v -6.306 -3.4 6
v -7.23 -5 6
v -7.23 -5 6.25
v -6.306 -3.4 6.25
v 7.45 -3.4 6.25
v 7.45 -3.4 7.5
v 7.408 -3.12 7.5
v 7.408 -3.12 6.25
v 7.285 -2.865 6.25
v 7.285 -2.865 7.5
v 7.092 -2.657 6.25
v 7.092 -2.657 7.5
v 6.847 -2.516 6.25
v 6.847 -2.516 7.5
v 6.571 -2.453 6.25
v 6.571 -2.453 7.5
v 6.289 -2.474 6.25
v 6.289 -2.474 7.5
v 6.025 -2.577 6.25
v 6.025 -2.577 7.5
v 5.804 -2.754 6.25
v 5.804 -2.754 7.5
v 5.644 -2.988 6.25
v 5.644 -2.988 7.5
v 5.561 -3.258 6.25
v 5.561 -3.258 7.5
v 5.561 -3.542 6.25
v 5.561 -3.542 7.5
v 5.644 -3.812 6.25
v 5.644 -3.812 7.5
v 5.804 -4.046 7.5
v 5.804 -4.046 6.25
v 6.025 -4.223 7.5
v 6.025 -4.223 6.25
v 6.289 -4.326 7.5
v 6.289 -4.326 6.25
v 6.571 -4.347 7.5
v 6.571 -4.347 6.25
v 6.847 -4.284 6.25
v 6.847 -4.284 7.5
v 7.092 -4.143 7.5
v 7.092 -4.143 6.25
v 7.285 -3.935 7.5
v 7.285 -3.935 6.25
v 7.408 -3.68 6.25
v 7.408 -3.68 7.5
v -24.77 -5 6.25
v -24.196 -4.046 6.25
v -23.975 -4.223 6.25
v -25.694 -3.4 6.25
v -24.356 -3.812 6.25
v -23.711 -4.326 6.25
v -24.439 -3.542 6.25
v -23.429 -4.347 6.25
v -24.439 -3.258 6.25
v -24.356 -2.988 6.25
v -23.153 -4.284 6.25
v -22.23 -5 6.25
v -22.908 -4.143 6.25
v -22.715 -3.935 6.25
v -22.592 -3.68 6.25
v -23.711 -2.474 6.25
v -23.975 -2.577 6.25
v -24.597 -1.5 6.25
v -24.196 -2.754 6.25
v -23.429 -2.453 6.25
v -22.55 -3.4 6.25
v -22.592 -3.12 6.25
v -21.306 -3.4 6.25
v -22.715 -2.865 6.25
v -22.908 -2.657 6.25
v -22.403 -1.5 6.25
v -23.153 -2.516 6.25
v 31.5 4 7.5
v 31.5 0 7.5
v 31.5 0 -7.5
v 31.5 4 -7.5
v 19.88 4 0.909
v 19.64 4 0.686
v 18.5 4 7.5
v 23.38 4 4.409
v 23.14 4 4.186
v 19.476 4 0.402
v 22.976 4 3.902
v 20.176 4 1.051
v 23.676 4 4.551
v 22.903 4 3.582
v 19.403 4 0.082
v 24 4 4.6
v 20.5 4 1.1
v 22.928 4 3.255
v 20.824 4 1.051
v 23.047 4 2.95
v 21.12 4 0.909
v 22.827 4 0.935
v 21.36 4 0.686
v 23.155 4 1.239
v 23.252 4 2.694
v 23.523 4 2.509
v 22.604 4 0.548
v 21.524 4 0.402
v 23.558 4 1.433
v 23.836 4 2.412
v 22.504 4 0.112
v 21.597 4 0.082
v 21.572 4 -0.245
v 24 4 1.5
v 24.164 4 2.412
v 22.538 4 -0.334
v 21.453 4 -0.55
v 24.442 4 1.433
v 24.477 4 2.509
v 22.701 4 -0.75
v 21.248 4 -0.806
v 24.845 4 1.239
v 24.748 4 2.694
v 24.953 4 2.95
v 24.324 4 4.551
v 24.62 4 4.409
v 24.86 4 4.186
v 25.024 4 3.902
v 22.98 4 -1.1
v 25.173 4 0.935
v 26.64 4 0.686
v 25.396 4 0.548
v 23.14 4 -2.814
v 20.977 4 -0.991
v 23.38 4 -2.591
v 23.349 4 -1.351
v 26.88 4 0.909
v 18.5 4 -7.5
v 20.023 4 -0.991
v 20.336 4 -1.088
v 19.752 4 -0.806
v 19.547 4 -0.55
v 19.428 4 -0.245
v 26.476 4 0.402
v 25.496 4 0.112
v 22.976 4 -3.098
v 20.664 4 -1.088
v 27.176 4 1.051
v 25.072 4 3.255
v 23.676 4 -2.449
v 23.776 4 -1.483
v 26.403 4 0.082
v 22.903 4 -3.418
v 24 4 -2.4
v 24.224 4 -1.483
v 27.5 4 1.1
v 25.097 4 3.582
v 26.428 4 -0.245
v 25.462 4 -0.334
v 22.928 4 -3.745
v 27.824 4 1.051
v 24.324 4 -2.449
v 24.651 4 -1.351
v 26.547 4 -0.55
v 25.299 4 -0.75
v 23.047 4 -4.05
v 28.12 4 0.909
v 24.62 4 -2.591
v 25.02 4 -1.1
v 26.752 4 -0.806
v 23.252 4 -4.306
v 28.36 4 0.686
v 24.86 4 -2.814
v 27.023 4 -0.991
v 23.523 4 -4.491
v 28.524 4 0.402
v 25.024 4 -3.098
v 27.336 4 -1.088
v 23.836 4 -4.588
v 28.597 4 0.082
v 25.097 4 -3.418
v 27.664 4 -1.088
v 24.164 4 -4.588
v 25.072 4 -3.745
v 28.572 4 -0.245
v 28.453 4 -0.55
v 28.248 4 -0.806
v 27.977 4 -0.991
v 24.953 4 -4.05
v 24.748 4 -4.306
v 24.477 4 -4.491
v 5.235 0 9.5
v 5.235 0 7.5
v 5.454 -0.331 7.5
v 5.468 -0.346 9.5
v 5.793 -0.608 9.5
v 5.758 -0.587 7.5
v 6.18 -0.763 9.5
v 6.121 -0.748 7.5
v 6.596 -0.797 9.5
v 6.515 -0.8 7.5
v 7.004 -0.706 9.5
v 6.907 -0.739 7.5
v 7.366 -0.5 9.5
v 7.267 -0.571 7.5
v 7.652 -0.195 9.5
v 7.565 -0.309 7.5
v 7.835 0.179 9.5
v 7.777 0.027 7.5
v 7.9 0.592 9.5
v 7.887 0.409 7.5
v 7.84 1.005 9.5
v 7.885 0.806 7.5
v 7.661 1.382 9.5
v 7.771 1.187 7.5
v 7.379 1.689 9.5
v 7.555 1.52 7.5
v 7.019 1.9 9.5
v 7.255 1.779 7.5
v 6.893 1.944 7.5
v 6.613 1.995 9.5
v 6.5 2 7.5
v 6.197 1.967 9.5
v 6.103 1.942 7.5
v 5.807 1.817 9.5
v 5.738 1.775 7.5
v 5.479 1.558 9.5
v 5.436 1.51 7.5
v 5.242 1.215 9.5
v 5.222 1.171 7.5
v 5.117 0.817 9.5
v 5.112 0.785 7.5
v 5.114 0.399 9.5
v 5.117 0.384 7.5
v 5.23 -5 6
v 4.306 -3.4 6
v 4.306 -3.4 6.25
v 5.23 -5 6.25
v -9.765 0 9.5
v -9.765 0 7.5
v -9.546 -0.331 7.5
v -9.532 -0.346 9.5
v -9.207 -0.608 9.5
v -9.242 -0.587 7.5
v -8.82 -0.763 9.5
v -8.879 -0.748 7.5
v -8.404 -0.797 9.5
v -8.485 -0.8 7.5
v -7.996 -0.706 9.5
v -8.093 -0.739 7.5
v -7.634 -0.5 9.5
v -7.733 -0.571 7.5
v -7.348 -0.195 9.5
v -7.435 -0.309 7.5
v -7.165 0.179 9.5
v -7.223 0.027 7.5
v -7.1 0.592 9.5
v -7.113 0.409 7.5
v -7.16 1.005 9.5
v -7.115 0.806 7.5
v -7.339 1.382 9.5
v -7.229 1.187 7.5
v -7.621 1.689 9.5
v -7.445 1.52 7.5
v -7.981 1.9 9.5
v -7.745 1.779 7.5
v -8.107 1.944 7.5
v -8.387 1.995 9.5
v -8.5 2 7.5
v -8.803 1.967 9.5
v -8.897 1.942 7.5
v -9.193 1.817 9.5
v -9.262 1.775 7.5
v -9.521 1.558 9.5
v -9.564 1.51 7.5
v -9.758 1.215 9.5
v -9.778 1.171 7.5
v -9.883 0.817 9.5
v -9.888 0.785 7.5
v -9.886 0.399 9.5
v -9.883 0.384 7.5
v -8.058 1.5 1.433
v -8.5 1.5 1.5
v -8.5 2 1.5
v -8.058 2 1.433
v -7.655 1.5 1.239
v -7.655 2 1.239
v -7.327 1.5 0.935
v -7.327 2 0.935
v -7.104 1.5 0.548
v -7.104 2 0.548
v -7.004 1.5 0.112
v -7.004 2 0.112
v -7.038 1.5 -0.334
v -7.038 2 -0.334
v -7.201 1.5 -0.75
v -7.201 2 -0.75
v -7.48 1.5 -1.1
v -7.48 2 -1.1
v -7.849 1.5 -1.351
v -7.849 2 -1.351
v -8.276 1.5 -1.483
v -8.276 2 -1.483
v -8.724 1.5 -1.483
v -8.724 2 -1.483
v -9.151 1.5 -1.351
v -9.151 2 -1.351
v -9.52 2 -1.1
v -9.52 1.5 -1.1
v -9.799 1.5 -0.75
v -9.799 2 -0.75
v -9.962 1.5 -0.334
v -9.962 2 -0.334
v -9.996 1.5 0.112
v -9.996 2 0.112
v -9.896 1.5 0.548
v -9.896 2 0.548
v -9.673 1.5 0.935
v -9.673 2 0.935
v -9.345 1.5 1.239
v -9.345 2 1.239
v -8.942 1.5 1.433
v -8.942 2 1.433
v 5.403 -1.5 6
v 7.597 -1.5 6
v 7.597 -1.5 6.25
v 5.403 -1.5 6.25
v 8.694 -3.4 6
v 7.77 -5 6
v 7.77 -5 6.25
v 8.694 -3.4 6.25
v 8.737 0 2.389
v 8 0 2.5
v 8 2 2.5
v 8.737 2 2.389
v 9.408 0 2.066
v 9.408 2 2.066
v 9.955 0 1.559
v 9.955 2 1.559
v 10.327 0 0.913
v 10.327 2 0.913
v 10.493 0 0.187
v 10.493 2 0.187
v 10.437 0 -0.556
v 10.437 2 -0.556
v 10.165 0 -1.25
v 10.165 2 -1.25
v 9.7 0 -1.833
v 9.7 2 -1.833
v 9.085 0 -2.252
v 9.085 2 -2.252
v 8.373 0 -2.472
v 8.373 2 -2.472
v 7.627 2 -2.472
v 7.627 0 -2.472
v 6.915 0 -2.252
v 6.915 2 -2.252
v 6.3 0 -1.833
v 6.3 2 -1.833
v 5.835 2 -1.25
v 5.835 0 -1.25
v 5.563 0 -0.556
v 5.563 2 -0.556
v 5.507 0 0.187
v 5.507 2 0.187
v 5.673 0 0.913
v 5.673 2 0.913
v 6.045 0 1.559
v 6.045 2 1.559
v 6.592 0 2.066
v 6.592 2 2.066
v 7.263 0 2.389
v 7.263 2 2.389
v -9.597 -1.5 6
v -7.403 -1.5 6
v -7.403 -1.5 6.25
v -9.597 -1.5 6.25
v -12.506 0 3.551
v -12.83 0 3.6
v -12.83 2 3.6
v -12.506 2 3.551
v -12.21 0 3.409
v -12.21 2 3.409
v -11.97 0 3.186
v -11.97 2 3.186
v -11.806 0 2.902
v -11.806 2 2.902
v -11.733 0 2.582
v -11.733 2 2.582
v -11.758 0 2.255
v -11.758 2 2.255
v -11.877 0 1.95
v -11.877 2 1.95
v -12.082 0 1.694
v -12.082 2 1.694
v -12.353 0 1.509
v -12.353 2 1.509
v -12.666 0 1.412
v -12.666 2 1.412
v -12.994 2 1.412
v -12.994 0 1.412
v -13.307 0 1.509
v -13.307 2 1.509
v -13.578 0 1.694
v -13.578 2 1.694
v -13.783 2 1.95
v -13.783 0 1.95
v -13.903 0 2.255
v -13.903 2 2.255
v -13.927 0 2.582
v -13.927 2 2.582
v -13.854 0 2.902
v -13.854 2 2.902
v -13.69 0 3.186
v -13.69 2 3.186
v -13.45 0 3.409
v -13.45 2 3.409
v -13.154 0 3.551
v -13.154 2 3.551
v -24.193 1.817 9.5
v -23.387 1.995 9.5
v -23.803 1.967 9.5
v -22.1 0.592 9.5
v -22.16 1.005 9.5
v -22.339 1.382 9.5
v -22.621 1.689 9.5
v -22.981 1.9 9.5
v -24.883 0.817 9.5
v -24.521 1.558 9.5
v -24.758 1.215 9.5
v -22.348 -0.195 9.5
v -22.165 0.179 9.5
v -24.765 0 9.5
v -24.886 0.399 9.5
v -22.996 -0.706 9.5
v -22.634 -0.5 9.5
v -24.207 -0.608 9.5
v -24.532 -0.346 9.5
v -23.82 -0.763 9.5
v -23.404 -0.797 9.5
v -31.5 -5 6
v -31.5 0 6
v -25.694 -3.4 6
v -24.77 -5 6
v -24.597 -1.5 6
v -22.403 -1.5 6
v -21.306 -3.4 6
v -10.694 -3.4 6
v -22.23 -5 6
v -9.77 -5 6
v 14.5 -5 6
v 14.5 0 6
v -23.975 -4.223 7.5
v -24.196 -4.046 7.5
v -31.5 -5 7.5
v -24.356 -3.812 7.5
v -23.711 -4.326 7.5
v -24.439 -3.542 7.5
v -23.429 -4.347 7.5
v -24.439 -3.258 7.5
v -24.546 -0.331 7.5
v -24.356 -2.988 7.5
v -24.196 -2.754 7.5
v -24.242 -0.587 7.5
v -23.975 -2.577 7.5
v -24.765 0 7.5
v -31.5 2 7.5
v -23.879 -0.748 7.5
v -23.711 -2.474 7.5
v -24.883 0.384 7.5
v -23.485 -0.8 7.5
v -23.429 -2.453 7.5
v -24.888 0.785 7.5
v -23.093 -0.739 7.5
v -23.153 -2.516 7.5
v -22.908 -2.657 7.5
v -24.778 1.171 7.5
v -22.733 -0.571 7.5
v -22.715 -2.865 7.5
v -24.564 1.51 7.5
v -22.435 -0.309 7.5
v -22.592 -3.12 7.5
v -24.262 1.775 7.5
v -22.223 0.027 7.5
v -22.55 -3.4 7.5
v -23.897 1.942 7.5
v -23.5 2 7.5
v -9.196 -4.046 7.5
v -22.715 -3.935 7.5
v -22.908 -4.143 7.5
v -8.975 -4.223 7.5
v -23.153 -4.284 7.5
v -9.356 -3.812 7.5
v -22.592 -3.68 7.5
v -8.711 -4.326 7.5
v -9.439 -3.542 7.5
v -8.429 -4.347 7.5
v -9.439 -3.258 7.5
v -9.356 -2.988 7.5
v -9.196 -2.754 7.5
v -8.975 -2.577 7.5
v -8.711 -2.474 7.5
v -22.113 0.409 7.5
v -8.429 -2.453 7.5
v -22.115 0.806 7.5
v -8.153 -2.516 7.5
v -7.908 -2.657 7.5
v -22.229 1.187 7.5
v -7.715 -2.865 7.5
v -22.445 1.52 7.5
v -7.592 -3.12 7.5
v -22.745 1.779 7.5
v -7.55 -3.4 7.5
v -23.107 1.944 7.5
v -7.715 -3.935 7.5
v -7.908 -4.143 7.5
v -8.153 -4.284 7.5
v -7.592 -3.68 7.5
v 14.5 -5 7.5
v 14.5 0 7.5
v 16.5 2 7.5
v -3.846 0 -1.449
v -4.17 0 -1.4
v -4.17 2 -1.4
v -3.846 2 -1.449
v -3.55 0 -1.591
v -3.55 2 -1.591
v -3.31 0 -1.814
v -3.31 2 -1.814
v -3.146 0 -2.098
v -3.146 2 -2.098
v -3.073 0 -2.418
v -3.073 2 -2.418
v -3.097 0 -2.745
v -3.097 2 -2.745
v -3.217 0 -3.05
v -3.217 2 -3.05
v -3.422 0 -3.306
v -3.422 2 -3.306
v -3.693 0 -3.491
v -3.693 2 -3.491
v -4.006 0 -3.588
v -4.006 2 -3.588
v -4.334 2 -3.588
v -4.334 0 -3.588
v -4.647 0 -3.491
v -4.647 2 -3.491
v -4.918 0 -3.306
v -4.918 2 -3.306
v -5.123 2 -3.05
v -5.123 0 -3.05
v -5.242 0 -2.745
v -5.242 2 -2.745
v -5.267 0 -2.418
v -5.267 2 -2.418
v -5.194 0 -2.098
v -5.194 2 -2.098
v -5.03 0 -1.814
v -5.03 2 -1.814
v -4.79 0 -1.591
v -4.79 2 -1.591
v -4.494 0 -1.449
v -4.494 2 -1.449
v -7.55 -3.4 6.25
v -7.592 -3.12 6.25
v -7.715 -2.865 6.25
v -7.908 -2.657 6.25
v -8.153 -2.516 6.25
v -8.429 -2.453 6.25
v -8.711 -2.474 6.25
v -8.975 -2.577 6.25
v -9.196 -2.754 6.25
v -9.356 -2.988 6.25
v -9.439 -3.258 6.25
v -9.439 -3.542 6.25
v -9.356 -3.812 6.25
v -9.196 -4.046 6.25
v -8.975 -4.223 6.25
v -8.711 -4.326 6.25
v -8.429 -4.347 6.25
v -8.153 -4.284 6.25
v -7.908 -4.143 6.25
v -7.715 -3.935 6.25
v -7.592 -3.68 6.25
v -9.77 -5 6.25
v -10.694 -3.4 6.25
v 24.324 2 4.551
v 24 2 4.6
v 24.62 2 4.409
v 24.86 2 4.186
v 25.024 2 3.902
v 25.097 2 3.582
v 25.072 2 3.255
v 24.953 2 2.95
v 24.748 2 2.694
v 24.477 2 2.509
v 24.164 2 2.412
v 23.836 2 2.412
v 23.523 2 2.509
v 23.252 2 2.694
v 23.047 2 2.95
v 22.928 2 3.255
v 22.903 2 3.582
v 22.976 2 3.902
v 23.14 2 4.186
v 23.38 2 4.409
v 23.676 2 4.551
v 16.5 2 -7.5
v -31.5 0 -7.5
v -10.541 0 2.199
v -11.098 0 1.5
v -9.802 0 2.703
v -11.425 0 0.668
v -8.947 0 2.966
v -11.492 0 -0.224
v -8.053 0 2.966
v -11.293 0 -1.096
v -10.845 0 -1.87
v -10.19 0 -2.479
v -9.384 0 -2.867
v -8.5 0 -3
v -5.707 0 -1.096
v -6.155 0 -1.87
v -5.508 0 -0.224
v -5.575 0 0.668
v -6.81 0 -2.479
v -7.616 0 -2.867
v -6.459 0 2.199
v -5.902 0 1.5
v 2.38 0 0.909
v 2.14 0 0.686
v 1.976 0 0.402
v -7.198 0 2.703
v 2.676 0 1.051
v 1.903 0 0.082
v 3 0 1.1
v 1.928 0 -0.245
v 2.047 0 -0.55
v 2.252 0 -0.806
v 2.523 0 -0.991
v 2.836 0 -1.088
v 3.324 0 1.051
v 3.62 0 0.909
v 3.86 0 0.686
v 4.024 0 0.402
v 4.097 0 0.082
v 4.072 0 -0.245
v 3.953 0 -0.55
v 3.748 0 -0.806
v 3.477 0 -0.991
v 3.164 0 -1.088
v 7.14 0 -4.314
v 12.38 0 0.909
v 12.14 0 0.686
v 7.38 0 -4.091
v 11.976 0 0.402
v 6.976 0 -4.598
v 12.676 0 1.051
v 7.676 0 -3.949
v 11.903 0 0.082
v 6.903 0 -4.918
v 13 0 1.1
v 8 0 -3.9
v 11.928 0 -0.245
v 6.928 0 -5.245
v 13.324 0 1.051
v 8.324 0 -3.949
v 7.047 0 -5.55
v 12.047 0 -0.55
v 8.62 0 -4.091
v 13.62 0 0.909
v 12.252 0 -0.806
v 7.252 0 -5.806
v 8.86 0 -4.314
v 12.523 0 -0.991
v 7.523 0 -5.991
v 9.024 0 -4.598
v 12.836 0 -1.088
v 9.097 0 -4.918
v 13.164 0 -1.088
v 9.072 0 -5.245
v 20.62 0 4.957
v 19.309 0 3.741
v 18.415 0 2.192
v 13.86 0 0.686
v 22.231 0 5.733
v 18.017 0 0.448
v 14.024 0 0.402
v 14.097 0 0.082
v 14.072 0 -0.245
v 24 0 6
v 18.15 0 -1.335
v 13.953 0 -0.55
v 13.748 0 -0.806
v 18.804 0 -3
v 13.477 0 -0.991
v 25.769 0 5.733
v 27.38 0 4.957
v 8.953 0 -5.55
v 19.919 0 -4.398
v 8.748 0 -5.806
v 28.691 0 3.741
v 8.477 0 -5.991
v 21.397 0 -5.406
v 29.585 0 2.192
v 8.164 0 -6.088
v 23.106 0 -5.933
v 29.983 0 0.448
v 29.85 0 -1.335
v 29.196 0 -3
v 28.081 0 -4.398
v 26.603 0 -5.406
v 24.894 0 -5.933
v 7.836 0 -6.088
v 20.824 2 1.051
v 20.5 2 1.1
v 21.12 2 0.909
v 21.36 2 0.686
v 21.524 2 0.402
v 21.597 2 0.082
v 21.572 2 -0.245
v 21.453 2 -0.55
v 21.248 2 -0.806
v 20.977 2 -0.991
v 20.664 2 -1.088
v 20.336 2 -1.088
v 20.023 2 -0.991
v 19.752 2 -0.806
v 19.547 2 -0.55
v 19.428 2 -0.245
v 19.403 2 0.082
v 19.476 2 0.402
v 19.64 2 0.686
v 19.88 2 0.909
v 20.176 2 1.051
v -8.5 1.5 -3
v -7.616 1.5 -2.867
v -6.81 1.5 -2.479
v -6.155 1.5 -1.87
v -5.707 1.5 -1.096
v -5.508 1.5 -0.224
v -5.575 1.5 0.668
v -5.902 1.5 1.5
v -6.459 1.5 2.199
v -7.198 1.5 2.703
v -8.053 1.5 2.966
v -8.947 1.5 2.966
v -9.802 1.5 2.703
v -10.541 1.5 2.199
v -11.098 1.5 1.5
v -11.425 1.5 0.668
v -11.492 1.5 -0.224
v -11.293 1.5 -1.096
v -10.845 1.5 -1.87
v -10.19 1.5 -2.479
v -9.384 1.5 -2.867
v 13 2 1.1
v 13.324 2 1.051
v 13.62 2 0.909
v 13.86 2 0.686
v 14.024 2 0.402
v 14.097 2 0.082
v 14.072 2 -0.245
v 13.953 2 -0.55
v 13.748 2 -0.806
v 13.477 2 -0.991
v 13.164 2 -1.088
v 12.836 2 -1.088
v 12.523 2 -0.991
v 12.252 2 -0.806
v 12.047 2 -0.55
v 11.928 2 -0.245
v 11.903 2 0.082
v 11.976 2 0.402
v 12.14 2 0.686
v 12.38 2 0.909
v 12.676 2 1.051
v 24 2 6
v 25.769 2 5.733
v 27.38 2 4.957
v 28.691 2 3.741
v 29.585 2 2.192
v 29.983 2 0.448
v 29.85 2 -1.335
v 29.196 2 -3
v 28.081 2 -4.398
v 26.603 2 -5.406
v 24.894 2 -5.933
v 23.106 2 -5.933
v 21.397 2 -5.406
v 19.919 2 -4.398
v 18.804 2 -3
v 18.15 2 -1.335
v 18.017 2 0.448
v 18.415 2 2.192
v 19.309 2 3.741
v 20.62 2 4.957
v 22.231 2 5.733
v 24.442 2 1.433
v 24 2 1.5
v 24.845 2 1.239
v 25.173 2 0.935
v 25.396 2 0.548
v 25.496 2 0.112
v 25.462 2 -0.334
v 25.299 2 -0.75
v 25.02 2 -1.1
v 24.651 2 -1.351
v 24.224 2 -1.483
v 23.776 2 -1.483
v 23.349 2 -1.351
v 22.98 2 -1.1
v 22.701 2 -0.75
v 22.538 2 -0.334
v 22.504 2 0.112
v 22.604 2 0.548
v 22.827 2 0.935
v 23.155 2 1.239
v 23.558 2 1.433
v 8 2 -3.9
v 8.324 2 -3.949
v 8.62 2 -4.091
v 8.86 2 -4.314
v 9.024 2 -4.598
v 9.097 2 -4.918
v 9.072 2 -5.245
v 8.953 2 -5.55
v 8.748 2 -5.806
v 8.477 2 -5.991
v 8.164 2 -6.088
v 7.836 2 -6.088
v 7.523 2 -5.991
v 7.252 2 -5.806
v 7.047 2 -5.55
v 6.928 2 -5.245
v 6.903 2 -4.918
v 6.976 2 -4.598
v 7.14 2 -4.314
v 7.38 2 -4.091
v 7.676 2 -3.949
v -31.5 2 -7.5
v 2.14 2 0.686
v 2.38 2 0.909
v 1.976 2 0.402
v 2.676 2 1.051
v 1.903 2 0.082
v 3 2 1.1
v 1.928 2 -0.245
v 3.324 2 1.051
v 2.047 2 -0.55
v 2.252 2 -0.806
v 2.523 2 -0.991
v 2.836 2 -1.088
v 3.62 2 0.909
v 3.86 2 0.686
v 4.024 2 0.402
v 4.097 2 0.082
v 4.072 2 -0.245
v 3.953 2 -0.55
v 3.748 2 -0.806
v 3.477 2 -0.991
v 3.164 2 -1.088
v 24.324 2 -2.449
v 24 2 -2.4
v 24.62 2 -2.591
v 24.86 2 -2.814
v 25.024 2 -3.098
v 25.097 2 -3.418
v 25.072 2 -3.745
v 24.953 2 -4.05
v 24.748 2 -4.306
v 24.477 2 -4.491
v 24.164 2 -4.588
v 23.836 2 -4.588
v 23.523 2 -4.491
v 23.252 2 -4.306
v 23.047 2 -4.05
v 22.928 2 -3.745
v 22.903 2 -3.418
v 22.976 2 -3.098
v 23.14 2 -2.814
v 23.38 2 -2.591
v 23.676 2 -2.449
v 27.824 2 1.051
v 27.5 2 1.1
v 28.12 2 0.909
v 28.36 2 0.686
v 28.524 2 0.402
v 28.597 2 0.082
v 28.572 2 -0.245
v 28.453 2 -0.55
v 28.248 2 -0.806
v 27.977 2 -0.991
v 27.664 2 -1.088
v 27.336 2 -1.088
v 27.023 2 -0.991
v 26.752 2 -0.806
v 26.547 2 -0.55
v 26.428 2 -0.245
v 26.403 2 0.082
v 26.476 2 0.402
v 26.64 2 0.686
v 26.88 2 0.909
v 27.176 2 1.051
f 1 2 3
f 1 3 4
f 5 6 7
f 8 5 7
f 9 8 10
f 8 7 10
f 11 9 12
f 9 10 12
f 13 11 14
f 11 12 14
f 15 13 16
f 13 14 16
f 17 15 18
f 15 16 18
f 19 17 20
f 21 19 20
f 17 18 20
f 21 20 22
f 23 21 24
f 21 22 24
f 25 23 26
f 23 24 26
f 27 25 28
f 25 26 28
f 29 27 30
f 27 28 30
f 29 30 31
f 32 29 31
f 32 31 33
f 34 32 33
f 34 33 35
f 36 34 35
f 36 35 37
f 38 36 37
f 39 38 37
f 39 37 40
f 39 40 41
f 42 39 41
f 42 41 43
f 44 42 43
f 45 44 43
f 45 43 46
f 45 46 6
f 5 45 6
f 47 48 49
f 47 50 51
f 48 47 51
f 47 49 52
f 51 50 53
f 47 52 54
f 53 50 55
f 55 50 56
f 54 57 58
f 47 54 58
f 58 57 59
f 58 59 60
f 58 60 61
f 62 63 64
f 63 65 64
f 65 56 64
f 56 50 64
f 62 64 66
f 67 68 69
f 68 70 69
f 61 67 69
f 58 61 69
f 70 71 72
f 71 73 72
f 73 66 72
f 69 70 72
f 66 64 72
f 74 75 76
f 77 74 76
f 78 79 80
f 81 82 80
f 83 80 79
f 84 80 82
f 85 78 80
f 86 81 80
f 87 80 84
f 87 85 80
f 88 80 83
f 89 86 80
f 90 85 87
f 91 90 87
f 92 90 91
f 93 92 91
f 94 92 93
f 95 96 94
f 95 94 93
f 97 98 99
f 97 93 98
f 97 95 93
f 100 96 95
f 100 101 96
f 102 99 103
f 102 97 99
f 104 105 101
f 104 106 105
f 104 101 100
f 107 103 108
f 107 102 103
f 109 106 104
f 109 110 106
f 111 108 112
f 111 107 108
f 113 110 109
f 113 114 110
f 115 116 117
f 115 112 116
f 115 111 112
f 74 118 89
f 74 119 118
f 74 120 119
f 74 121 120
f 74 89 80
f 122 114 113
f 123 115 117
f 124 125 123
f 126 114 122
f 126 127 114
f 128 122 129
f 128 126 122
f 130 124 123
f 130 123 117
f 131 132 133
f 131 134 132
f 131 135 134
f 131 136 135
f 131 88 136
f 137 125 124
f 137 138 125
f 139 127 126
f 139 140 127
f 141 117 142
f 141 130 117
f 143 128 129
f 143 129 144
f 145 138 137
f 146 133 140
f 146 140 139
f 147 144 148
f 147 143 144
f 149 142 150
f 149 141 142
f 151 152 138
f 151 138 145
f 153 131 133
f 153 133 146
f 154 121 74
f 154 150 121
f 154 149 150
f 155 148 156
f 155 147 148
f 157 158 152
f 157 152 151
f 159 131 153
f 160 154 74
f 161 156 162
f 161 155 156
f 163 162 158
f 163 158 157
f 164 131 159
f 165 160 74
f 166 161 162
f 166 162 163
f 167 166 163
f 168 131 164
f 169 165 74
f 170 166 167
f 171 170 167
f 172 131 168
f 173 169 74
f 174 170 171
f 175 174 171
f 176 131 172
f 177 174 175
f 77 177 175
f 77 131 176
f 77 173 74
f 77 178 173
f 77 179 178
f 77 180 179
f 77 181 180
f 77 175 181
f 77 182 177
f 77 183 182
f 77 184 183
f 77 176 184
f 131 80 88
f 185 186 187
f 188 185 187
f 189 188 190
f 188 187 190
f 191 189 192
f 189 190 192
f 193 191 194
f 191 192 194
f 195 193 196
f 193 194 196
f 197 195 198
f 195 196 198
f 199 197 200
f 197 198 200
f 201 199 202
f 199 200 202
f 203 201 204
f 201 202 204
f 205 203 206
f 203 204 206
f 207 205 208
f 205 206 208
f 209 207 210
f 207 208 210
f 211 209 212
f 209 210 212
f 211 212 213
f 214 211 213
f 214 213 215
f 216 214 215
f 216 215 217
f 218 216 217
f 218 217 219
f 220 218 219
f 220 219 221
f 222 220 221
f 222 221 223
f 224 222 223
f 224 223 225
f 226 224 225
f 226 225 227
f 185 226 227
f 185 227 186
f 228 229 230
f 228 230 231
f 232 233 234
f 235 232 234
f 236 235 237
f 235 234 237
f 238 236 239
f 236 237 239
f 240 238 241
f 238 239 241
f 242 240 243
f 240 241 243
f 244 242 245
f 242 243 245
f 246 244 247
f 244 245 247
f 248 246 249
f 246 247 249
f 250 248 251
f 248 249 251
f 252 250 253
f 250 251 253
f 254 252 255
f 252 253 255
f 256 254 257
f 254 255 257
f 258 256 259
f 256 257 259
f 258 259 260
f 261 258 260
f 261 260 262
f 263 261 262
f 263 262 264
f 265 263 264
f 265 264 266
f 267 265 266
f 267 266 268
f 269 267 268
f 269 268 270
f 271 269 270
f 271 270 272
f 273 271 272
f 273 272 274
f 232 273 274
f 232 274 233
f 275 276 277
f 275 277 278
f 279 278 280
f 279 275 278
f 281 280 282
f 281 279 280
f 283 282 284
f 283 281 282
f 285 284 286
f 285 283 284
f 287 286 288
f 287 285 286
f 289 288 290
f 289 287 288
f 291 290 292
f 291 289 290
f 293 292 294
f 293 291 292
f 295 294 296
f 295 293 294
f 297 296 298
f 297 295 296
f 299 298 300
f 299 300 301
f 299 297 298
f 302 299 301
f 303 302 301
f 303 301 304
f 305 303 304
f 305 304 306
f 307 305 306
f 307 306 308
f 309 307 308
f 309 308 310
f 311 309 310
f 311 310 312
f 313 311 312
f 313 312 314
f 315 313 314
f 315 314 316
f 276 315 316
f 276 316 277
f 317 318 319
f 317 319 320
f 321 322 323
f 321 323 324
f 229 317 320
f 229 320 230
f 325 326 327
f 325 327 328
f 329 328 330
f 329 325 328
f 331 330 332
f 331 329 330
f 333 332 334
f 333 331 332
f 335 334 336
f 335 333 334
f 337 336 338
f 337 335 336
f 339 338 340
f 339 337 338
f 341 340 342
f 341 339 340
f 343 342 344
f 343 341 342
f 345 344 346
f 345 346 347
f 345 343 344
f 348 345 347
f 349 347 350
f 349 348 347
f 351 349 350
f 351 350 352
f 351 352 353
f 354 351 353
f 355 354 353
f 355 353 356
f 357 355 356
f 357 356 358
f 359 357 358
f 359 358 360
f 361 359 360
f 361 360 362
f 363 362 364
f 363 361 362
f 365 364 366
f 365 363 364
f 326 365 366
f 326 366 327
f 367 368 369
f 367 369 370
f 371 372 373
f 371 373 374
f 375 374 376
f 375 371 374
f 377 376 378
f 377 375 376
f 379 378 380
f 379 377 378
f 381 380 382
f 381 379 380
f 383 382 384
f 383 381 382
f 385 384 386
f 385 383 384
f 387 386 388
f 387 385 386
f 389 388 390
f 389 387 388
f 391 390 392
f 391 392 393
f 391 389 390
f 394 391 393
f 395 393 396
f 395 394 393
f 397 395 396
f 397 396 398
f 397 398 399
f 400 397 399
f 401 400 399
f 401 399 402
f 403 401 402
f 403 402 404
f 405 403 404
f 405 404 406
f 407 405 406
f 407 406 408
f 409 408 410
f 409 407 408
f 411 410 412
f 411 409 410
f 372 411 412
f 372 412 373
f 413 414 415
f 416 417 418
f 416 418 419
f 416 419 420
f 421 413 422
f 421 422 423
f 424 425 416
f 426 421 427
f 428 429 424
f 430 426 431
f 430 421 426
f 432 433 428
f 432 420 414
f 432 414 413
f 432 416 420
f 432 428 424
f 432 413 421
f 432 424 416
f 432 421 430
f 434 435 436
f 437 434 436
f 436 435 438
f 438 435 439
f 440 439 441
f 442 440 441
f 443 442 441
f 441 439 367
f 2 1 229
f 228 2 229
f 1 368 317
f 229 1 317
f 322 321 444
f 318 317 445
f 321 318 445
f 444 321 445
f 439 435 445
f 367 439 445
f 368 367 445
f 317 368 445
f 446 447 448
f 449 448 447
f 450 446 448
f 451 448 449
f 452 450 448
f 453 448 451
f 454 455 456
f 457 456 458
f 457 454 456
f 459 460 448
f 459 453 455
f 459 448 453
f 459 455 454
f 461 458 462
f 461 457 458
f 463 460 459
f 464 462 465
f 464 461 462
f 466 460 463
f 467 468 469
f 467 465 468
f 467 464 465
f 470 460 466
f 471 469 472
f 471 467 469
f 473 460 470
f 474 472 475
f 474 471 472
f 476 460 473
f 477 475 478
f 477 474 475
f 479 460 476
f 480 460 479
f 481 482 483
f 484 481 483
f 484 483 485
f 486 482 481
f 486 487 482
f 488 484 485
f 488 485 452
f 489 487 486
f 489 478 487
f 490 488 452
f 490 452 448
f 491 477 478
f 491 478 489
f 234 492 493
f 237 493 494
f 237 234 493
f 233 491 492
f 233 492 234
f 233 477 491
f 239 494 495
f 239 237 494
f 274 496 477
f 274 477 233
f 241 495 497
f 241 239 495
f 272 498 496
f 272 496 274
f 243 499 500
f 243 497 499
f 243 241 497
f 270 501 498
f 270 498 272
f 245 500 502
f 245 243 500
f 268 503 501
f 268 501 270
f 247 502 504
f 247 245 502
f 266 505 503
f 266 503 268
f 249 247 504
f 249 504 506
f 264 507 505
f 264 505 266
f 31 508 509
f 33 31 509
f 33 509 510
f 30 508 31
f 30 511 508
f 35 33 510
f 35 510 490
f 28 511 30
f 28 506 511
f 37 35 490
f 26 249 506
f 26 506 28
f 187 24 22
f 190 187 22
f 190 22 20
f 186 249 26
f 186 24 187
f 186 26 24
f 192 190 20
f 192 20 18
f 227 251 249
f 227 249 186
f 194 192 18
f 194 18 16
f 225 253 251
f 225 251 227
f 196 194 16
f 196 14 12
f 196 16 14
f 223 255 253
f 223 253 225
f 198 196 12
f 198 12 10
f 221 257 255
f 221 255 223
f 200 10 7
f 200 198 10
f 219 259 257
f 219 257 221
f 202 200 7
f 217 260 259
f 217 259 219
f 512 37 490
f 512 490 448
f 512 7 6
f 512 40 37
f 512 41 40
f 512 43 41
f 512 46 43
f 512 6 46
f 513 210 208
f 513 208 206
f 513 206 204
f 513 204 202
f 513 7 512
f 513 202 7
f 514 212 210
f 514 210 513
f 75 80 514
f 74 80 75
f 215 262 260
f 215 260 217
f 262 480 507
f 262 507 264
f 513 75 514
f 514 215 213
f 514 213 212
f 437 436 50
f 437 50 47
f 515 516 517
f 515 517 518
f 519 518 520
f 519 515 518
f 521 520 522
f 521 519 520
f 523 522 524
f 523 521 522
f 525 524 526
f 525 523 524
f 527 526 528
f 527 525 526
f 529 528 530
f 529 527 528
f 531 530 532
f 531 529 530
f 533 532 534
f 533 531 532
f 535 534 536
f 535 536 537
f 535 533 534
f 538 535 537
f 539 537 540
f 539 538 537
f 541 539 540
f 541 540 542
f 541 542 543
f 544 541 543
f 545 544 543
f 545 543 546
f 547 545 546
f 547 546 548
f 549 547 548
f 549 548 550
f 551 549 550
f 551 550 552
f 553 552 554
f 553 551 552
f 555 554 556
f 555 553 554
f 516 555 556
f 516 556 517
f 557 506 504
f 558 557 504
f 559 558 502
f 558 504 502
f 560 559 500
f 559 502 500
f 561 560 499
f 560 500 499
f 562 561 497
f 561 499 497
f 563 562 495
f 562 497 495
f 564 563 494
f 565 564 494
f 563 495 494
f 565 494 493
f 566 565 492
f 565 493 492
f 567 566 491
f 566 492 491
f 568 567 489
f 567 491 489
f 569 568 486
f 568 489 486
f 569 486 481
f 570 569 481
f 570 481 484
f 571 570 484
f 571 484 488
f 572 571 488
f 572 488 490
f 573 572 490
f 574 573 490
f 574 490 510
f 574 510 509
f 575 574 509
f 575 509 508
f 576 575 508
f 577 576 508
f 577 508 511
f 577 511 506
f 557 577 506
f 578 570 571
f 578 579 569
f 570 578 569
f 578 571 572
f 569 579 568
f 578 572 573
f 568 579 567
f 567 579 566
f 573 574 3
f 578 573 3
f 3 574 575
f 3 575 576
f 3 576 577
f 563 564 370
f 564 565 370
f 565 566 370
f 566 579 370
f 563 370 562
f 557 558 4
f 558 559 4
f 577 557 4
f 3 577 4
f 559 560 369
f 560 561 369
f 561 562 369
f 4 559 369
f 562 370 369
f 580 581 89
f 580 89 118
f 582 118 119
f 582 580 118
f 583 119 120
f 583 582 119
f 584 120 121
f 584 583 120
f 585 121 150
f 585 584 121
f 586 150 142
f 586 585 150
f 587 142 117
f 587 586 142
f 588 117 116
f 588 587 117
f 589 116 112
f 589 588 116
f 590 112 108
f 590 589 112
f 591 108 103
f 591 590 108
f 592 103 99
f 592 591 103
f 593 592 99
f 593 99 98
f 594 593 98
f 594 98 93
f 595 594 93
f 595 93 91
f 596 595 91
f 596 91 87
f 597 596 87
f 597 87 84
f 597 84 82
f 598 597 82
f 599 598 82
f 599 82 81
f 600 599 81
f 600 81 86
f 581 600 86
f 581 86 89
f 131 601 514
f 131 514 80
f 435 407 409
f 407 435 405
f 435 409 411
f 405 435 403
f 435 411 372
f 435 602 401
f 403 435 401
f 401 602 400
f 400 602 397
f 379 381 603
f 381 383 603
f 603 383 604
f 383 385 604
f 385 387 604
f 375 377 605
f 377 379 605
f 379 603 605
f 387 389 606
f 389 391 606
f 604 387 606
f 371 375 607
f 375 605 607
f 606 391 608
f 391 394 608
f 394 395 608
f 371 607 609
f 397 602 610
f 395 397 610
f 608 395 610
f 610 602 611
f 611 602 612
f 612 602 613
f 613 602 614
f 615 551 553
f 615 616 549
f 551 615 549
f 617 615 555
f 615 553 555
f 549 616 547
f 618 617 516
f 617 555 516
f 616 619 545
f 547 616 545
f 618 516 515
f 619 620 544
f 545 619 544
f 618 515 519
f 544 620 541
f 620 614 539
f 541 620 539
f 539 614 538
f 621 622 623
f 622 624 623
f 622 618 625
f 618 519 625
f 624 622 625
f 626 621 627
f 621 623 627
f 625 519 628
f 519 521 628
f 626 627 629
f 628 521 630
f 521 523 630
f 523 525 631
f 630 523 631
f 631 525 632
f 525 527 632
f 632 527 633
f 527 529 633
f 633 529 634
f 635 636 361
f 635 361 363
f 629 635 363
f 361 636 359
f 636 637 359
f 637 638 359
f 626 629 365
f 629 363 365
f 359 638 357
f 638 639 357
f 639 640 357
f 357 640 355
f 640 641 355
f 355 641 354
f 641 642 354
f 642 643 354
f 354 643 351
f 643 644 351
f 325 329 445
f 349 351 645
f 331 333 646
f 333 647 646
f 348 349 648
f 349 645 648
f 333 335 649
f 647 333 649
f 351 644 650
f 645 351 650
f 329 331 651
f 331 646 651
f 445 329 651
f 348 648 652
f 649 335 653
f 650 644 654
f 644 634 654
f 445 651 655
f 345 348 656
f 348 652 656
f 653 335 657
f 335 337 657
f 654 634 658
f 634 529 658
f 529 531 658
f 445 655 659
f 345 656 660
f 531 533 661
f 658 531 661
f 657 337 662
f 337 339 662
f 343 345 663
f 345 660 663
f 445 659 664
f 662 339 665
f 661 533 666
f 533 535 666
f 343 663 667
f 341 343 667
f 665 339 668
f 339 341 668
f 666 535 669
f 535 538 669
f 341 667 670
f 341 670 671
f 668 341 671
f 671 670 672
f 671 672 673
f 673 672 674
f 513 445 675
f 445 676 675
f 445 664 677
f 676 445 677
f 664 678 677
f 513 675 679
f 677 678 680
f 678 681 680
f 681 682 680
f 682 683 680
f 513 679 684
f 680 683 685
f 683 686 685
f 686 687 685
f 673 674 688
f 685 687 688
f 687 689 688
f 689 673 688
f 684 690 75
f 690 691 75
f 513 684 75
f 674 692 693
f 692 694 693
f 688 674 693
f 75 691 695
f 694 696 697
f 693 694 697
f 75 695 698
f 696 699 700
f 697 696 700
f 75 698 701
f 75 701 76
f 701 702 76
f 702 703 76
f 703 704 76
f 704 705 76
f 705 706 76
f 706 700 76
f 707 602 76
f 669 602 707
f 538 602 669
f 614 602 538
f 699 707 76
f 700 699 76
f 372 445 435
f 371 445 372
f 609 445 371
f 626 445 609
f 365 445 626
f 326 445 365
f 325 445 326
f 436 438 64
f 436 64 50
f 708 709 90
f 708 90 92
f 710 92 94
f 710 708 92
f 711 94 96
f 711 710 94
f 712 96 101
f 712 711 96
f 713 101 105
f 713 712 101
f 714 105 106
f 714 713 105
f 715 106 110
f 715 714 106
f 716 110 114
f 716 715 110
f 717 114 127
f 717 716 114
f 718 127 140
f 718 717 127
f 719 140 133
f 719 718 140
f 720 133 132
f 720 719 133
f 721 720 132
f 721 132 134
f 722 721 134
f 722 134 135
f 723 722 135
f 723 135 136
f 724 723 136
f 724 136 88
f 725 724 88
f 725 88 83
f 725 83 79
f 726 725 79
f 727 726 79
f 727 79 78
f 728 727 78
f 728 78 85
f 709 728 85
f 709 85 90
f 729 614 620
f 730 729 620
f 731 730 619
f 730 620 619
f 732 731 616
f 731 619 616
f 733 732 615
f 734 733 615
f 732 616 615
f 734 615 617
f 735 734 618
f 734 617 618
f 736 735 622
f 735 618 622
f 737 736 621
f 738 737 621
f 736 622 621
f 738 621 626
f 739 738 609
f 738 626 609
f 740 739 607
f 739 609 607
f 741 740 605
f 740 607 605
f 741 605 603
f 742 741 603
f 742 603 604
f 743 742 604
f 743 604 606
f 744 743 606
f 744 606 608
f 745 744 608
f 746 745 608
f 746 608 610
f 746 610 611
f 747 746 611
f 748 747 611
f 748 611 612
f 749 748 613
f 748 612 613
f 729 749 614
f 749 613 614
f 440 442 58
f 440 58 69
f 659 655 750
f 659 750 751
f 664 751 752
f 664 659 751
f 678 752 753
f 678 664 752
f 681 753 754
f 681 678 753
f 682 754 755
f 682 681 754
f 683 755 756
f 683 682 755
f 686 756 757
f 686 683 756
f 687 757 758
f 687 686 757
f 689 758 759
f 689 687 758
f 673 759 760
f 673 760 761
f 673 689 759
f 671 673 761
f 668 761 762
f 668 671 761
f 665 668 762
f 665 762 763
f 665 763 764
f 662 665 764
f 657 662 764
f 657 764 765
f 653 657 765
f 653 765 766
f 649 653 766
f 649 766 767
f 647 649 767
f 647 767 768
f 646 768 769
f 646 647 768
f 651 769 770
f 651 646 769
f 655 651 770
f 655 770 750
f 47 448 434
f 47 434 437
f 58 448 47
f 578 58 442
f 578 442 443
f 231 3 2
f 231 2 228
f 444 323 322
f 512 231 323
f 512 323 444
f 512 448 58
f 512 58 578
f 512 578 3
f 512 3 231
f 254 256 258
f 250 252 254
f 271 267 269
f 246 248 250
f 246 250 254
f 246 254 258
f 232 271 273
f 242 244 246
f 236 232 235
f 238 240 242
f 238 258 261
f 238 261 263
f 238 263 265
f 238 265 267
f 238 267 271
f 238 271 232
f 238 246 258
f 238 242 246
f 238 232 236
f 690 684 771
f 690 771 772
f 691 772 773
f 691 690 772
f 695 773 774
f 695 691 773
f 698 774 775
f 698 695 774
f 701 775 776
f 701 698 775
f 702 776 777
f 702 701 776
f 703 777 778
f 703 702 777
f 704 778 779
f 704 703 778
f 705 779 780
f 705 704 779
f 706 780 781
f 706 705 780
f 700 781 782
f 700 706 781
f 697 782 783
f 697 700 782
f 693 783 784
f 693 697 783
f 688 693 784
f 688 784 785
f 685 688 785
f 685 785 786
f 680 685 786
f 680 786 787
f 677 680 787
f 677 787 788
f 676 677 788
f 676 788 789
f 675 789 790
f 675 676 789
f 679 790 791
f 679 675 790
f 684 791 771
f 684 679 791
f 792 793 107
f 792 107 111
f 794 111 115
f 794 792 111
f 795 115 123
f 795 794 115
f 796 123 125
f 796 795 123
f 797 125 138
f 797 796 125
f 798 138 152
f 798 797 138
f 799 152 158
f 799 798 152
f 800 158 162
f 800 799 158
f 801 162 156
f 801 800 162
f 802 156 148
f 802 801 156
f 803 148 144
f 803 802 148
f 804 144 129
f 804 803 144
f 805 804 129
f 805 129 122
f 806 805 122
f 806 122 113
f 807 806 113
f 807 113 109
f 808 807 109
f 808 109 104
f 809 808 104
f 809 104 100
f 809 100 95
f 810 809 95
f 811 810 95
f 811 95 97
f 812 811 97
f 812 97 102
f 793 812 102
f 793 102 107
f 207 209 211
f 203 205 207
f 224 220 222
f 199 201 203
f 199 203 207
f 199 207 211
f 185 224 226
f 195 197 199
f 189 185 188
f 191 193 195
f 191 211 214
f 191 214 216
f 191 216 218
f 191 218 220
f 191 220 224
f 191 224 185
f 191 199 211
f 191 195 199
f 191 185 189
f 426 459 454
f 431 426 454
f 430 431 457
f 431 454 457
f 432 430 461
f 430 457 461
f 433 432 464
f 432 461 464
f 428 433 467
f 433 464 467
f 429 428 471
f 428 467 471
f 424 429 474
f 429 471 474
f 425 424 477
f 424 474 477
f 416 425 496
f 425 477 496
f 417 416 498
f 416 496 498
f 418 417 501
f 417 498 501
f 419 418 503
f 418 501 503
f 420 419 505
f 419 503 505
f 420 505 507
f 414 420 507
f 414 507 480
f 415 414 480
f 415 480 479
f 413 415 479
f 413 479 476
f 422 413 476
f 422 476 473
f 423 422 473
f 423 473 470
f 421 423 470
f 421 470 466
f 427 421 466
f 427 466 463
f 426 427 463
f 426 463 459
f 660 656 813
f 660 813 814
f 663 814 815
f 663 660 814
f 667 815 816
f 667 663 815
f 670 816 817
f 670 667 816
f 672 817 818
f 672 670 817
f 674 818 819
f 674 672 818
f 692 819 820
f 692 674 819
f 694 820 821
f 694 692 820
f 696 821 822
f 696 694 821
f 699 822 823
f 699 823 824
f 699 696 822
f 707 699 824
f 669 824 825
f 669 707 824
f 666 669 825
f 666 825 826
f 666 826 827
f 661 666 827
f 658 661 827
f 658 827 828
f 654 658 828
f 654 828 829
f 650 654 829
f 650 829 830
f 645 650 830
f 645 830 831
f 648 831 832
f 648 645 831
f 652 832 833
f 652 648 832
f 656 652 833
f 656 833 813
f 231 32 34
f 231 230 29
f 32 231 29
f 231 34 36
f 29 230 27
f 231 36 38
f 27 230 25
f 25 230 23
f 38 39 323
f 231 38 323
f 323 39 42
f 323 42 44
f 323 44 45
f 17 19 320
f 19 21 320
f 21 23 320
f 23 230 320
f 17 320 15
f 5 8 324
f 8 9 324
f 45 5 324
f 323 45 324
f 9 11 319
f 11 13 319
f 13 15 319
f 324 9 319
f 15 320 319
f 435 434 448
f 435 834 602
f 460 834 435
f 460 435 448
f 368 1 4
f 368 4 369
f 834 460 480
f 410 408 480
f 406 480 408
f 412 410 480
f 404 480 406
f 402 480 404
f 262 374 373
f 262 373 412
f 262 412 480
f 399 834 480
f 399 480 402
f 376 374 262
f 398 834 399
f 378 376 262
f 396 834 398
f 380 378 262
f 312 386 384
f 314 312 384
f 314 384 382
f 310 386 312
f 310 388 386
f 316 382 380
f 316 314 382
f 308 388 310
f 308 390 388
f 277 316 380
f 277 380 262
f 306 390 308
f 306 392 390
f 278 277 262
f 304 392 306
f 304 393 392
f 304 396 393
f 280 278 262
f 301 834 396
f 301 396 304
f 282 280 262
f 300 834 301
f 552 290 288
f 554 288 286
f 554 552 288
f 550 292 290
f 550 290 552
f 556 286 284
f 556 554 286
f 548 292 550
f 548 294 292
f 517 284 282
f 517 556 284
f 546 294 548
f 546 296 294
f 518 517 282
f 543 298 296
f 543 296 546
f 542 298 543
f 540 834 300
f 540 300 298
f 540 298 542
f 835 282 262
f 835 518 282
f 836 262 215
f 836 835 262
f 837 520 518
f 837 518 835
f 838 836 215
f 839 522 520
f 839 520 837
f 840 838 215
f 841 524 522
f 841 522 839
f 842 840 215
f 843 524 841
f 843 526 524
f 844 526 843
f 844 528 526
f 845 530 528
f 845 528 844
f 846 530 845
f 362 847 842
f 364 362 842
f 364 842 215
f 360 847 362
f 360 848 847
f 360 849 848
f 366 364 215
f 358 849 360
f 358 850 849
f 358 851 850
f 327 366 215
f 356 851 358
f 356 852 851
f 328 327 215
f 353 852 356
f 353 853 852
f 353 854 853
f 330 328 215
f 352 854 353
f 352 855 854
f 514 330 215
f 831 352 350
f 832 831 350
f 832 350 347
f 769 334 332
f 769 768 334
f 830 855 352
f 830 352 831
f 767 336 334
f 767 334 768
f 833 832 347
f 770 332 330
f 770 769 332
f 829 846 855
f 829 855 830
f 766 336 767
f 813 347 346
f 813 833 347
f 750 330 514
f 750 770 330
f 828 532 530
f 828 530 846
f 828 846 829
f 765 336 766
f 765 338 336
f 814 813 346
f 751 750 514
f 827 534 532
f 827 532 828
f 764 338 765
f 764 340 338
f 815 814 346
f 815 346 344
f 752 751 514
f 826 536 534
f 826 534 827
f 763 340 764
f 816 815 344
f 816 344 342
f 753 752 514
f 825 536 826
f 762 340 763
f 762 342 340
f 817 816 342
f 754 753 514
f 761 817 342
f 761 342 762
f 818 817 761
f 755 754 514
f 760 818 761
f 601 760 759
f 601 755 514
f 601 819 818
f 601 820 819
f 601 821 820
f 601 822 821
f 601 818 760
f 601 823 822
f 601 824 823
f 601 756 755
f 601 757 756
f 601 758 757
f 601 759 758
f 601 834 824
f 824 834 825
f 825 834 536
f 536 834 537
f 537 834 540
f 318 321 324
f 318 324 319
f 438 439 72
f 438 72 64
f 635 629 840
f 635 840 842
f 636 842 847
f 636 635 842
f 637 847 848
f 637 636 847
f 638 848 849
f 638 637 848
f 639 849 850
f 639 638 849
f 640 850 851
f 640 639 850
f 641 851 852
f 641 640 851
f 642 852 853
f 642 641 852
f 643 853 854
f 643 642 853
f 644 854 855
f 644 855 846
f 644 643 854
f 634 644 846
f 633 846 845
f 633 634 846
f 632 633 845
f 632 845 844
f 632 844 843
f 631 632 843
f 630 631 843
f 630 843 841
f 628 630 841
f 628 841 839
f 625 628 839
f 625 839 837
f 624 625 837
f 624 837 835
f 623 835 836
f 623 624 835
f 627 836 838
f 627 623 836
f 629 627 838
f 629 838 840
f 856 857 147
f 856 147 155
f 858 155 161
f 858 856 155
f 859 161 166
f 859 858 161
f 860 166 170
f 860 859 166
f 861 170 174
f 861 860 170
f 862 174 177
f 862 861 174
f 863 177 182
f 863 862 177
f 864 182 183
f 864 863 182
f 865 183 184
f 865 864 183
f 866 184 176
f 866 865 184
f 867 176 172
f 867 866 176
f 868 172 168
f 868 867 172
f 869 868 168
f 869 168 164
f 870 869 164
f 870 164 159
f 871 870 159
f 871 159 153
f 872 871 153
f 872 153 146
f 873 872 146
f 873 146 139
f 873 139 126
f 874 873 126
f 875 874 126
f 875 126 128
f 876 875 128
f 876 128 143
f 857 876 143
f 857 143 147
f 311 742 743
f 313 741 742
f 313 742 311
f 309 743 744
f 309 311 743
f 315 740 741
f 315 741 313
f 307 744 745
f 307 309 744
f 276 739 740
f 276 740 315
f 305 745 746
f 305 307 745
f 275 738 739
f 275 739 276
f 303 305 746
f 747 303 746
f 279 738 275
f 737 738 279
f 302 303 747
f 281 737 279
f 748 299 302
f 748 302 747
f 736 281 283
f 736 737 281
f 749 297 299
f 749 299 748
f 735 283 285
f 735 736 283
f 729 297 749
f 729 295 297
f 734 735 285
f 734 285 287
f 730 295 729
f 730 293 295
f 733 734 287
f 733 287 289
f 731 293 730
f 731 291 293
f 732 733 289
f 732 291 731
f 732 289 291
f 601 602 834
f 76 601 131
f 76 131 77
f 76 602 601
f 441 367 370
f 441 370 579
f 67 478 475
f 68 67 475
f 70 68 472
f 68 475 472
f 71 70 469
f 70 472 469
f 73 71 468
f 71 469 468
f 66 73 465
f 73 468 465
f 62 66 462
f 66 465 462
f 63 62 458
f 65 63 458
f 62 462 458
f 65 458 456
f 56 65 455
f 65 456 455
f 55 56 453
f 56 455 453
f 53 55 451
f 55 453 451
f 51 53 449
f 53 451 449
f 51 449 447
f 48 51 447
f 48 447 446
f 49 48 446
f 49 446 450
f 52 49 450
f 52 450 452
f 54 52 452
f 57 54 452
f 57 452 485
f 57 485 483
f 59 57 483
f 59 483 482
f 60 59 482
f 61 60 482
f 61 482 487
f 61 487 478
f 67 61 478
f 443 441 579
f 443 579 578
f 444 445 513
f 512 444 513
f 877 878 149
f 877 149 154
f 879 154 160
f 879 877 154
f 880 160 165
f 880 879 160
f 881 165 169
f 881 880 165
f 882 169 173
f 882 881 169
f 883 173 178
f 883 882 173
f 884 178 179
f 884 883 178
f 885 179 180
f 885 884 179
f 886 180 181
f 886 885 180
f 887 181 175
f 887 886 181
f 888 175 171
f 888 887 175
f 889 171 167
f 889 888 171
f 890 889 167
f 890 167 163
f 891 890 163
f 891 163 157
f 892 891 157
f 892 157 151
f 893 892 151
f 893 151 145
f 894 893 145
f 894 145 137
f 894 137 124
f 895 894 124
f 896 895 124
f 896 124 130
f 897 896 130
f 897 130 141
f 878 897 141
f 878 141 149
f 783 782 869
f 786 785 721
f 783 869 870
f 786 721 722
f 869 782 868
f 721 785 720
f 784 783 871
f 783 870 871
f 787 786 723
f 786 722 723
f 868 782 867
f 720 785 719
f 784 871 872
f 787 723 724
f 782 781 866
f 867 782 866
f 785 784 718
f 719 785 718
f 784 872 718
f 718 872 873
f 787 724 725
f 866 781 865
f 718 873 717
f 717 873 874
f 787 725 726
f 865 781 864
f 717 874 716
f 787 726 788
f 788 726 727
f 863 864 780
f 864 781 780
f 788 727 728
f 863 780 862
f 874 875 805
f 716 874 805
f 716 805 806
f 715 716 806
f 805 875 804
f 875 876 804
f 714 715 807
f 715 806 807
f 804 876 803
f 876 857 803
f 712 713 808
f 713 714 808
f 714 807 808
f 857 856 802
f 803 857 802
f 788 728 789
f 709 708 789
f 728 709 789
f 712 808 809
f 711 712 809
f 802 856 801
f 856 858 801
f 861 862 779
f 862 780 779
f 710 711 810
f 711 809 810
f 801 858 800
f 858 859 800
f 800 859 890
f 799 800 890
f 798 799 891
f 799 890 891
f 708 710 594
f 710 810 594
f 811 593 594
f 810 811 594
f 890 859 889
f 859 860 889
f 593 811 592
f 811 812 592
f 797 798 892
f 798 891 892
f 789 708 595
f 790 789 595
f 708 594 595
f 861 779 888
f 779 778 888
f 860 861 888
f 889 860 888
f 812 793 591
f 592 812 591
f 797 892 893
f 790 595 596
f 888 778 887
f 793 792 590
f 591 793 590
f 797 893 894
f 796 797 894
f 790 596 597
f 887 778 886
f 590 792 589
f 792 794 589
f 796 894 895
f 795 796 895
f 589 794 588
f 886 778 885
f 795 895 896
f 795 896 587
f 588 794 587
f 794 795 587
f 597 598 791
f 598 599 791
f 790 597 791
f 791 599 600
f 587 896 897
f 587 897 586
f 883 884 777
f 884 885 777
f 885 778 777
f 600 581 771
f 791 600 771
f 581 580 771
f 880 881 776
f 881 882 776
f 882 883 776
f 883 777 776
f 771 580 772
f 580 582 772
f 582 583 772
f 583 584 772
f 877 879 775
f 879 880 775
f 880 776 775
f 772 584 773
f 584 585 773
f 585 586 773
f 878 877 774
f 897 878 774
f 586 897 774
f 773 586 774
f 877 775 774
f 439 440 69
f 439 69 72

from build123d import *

# Parameters (mm, degrees)
SKETCH_1_W          = 63
SKETCH_1_H          = 15
SKETCH_1_R          = 1.1
SKETCH_1_R_2        = 1.5
SKETCH_1_R_3        = 2.5
EXTRUDE_1_DEPTH     = 2
SKETCH_2_R          = 1.4
EXTRUDE_2_DEPTH     = 2
SKETCH_3_R          = 3
CUT_EXTRUDE_1_DEPTH = 1.5
SKETCH_4_W          = 46
SKETCH_4_H          = 1.5
EXTRUDE_3_DEPTH     = 5
SKETCH_2_3_R        = 0.95
CUT_EXTRUDE_2_DEPTH = 1.5
CUT_EXTRUDE_3_DEPTH = 0.25
SKETCH_1_7_W        = 15
SKETCH_1_7_H        = 15
SKETCH_1_7_R        = 1.5
SKETCH_1_7_R_2      = 1.1
EXTRUDE_4_DEPTH     = 4
SKETCH_1_8_R        = 6
SKETCH_1_8_R_2      = 1.5
SKETCH_1_8_R_3      = 1.1
CUT_EXTRUDE_4_DEPTH = 2
CUT_EXTRUDE_5_DEPTH = 15


with BuildPart() as part:
    # 草图1 → 凸台-拉伸1 (new body)
    with BuildSketch(Plane(origin=(0, 0, 0), x_dir=(1, 0, 0), z_dir=(0, 1, 0))):
        Rectangle(SKETCH_1_W, SKETCH_1_H)
        with Locations(Location((-12.830127019, -2.5, 0), (0, 0, 270))):
            Circle(SKETCH_1_R, mode=Mode.SUBTRACT)
        with Locations(Location((3, 0, 0), (0, 0, 270))):
            Circle(SKETCH_1_R, mode=Mode.SUBTRACT)
        with Locations(Location((-8.5, 0, 0), (0, 0, 270))):
            Circle(SKETCH_1_R_2, mode=Mode.SUBTRACT)
        with Locations(Location((-4.169872981, 2.5, 0), (0, 0, 270))):
            Circle(SKETCH_1_R, mode=Mode.SUBTRACT)
        with Locations(Location((8, 0, 0), (0, 0, 270))):
            Circle(SKETCH_1_R_3, mode=Mode.SUBTRACT)
        with Locations(Location((13, 0, 0), (0, 0, 270))):
            Circle(SKETCH_1_R, mode=Mode.SUBTRACT)
        with Locations(Location((8, 5, 0), (0, 0, 270))):
            Circle(SKETCH_1_R, mode=Mode.SUBTRACT)
        with Locations(Location((24, 3.5, 0), (0, 0, 270))):
            Circle(SKETCH_1_R, mode=Mode.SUBTRACT)
        with Locations(Location((24, -3.5, 0), (0, 0, 270))):
            Circle(SKETCH_1_R, mode=Mode.SUBTRACT)
        with Locations(Location((20.5, 0, 0), (0, 0, 270))):
            Circle(SKETCH_1_R, mode=Mode.SUBTRACT)
        with Locations(Location((24, 0, 0), (0, 0, 270))):
            Circle(SKETCH_1_R_2, mode=Mode.SUBTRACT)
        with Locations(Location((27.5, 0, 0), (0, 0, 270))):
            Circle(SKETCH_1_R, mode=Mode.SUBTRACT)
    extrude(amount=EXTRUDE_1_DEPTH)

    # 草图2 → 凸台-拉伸2 (add)
    with BuildSketch(Plane.XY.offset(7.5)):
        with Locations(Location((-23.5, 0.6, 0), (0, 0, 205.376933525))):
            Circle(SKETCH_2_R)
        with Locations(Location((-8.5, 0.6, 0), (0, 0, 205.376933525))):
            Circle(SKETCH_2_R)
        with Locations(Location((6.5, 0.6, 0), (0, 0, 205.376933525))):
            Circle(SKETCH_2_R)
    extrude(amount=EXTRUDE_2_DEPTH)

    # 草图3 → 切除-拉伸1 (cut)
    with BuildSketch(Plane.XZ):
        with Locations(Location((-8.5, 0, 0), (0, 0, 270))):
            Circle(SKETCH_3_R)
    extrude(amount=-CUT_EXTRUDE_1_DEPTH, mode=Mode.SUBTRACT)

    # 草图4 → 凸台-拉伸3 (add)
    with BuildSketch(Plane.XZ):
        with Locations((-8.5, 6.75)):
            Rectangle(SKETCH_4_W, SKETCH_4_H)
    extrude(amount=EXTRUDE_3_DEPTH)

    # 草图2<3> → 切除-拉伸2 (cut)
    with BuildSketch(Plane.XY.offset(7.5)):
        with Locations((-23.5, -3.4)):
            Circle(SKETCH_2_3_R)
        with Locations((-8.5, -3.4)):
            Circle(SKETCH_2_3_R)
        with Locations((6.5, -3.4)):
            Circle(SKETCH_2_3_R)
    extrude(amount=-CUT_EXTRUDE_2_DEPTH, mode=Mode.SUBTRACT)

    # 草图5 → 切除-拉伸3 (cut)
    with BuildSketch(Plane(origin=(0, 0, 6), x_dir=(-1, 0, 0), z_dir=(0, 0, -1))):
        Polygon((22.403034489, -1.5), (24.596965511, -1.5), (25.693931023, -3.4), (24.596965511, -5.3), (22.403034489, -5.3), (21.306068977, -3.4), align=None)
        Polygon((6.306068977, -3.4), (7.403034489, -1.5), (9.596965511, -1.5), (10.693931023, -3.4), (9.596965511, -5.3), (7.403034489, -5.3), align=None)
        Polygon((-8.693931023, -3.4), (-7.596965511, -1.5), (-5.403034489, -1.5), (-4.306068977, -3.4), (-5.403034489, -5.3), (-7.596965511, -5.3), align=None)
    extrude(amount=-CUT_EXTRUDE_3_DEPTH, mode=Mode.SUBTRACT)

    # 草图1<7> → 凸台-拉伸4 (add)
    with BuildSketch(Plane(origin=(0, 0, 0), x_dir=(1, 0, 0), z_dir=(0, 1, 0))):
        with Locations((24, 0)):
            Rectangle(SKETCH_1_7_W, SKETCH_1_7_H)
        with Locations(Location((24, 0, 0), (0, 0, 270))):
            Circle(SKETCH_1_7_R, mode=Mode.SUBTRACT)
        with Locations(Location((27.5, 0, 0), (0, 0, 270))):
            Circle(SKETCH_1_7_R_2, mode=Mode.SUBTRACT)
        with Locations(Location((24, -3.5, 0), (0, 0, 270))):
            Circle(SKETCH_1_7_R_2, mode=Mode.SUBTRACT)
        with Locations(Location((20.5, 0, 0), (0, 0, 270))):
            Circle(SKETCH_1_7_R_2, mode=Mode.SUBTRACT)
        with Locations(Location((24, 3.5, 0), (0, 0, 270))):
            Circle(SKETCH_1_7_R_2, mode=Mode.SUBTRACT)
    extrude(amount=EXTRUDE_4_DEPTH)

    # 草图1<8> → 切除-拉伸4 (cut)
    with BuildSketch(Plane(origin=(0, 0, 0), x_dir=(1, 0, 0), z_dir=(0, 1, 0))):
        with Locations(Location((24, 0, 0), (0, 0, 270))):
            Circle(SKETCH_1_8_R)
        with Locations(Location((24, 0, 0), (0, 0, 270))):
            Circle(SKETCH_1_8_R_2, mode=Mode.SUBTRACT)
        with Locations(Location((27.5, 0, 0), (0, 0, 270))):
            Circle(SKETCH_1_8_R_3, mode=Mode.SUBTRACT)
        with Locations(Location((24, -3.5, 0), (0, 0, 270))):
            Circle(SKETCH_1_8_R_3, mode=Mode.SUBTRACT)
        with Locations(Location((20.5, 0, 0), (0, 0, 270))):
            Circle(SKETCH_1_8_R_3, mode=Mode.SUBTRACT)
        with Locations(Location((24, 3.5, 0), (0, 0, 270))):
            Circle(SKETCH_1_8_R_3, mode=Mode.SUBTRACT)
    extrude(amount=CUT_EXTRUDE_4_DEPTH, mode=Mode.SUBTRACT)

    # 草图6 → 切除-拉伸5 (cut)
    with BuildSketch(Plane(origin=(0, 0, -7.5), x_dir=(-1, 0, 0), z_dir=(0, 0, -1))):
        Polygon((-16.5, 2), (-18.5, 4), (-16.5, 4), align=None)
    extrude(amount=-CUT_EXTRUDE_5_DEPTH, mode=Mode.SUBTRACT)


solid = part.part
